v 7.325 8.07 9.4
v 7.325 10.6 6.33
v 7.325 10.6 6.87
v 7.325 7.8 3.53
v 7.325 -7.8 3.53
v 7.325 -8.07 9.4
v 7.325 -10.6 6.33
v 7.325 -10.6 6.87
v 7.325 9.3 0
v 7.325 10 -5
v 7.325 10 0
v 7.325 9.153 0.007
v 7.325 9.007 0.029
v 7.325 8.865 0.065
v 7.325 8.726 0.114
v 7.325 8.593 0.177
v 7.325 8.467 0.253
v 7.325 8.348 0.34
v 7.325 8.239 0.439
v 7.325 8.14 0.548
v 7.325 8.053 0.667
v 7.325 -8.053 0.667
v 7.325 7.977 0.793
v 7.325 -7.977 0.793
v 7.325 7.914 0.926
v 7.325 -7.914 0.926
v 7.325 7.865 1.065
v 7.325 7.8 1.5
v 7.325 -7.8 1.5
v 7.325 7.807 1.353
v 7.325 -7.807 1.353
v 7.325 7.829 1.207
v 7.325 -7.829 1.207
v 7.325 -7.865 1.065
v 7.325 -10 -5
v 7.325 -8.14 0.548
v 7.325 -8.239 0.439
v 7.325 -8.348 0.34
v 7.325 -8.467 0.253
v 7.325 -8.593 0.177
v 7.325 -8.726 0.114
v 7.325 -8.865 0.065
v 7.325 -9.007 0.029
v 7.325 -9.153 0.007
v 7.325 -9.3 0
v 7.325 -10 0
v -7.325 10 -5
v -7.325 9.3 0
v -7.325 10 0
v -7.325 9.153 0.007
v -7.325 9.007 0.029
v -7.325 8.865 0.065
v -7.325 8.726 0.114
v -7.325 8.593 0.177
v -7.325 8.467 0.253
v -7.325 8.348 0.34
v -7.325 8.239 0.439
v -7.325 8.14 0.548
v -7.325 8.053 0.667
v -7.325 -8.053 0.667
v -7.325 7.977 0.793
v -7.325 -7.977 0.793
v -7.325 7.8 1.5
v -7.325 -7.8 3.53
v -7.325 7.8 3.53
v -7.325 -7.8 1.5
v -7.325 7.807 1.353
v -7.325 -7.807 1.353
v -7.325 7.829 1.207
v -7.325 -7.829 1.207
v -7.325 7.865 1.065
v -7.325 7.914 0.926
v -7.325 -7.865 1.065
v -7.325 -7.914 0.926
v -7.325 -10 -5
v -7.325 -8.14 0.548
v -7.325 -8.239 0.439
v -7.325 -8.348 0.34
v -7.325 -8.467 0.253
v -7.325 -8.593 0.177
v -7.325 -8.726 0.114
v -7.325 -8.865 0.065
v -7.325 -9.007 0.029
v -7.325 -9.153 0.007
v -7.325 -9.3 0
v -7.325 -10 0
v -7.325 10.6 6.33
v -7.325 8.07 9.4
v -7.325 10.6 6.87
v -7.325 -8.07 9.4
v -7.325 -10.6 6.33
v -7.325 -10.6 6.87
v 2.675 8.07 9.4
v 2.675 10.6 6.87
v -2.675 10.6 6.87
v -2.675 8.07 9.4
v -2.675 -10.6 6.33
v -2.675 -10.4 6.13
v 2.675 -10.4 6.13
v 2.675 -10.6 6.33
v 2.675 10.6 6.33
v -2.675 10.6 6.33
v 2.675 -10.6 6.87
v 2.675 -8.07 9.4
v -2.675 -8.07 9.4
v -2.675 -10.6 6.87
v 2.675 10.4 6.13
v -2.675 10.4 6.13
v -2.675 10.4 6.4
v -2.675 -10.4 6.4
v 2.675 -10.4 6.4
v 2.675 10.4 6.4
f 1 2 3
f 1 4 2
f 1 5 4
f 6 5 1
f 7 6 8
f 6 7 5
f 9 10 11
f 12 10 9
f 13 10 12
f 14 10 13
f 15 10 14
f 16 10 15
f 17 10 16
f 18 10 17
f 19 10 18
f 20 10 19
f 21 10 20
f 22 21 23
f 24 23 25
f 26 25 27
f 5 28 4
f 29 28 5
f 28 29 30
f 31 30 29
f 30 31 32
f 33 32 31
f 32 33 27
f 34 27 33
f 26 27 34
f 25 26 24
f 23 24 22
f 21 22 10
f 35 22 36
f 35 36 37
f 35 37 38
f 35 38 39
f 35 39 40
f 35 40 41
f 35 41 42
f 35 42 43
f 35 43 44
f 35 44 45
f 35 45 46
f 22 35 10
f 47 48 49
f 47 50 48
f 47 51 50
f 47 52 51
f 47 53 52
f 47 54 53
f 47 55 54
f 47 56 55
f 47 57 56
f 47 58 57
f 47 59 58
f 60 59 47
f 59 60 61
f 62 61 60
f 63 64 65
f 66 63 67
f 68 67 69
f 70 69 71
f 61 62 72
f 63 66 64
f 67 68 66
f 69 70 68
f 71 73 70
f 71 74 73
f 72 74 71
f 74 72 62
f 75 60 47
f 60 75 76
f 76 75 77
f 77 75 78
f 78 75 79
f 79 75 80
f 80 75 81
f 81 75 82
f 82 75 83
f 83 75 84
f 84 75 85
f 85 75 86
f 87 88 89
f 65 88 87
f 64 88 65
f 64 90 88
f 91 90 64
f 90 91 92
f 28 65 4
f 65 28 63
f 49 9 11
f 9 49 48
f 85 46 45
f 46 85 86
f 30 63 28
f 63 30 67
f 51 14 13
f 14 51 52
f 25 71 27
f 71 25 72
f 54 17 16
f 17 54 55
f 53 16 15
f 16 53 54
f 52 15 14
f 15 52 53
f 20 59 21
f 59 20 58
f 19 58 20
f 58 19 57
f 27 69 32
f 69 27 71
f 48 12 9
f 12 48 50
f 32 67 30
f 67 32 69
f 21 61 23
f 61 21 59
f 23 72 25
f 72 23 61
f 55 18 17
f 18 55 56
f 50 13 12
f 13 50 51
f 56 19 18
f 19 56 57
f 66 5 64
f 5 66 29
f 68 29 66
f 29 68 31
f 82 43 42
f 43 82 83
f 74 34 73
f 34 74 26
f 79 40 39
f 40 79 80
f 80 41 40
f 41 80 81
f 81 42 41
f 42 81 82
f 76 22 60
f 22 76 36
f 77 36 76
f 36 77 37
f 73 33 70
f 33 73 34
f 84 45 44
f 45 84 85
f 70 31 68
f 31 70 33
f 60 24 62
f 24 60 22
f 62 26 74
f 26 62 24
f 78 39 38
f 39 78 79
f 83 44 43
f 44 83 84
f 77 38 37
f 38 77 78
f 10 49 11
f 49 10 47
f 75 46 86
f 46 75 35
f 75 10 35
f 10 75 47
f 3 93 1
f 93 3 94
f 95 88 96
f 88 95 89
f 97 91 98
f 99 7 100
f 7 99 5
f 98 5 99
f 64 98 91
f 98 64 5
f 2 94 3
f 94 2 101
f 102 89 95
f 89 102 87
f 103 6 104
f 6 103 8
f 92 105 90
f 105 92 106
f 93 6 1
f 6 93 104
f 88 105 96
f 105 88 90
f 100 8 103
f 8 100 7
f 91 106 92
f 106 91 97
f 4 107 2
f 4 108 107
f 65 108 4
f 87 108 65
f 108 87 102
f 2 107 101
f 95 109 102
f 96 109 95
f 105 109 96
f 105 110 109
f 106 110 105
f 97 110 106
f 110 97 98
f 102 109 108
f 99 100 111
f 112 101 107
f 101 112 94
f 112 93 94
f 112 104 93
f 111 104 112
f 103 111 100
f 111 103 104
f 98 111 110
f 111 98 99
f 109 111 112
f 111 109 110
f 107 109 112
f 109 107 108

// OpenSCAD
nato_rail (1, true);


    module nato_rail (n, has_base)
    {
        ws = 5.35;

        h0 = 5;
        h1 = 3.53;
        h2 = 5.87;
        h3 = 3;

        w0 = 20;
        w1 = 15.6;
        
        l = 10 * (n + 1) - ws;
        
        translate ([0, 0, - h0])
        rotate ([90, 0, 90])
        translate ([0, 0, -l/2])
        rail(h0, h1, l, w0, w1);
        
        
        module rail(h0, h1, l, w0, w1)
        {
            difference ()
            {
                union ()
                {
                    railbase(h0, h1, l, w0, w1, has_base);
                    translate ([0, h0 + h1, 0])
                    railprism (l);
                };
                union ()
                {
                    for (i = [1:1:n]) {
                        translate ([0, h0 + h1, 10 * i - ws])
                        railslot(ws);
                    }
                };
            };
        };

        module railbase (h0, h1, l, w0, w1, has_base)
        {
            if (has_base) {
                translate ([0, h0 / 2, l/2])
                cube ([w0, h0, l], center = true);
                mirror([1,0,0])
                basefillet (h0, l, w1);
                basefillet (h0, l, w1);
            }
            translate ([0, h0 + h1 / 2, l/2])
            cube ([w1, h1, l], center = true);
        }
        
        module basefillet (h0, l, w1)
        {
        difference() {
                translate ([w1 / 2, h0, 0])
                cube ([1.5, 1.5, l]);
                translate ([w1 / 2 + 1.5, h0 + 1.5, l / 2])
                cylinder (l+1, 1.5, 1.5, $fn=64, center = true);
            }
        }
        
        module railprism (l)
        {
            linear_extrude (height = l, convexity = 10)
            polygon (points = [[7.8, 0], [10.6, 2.8], [10.6, 3.34], [8.07, 5.87], [-8.07, 5.87], [-10.6, 3.34], [-10.6, 2.8], [-7.8, 0]], convexity = 10);
        }
        
        module railslot (l)
        {
            linear_extrude (height = l, convexity = 10)
            polygon (points = [[11, 6], [11, 2.65], [10.4, 2.6], [10.4, 2.87], [-10.4, 2.87], [-10.4, 2.6], [-11, 2.65], [-11, 6]], convexity = 10);
        }
        
    }
